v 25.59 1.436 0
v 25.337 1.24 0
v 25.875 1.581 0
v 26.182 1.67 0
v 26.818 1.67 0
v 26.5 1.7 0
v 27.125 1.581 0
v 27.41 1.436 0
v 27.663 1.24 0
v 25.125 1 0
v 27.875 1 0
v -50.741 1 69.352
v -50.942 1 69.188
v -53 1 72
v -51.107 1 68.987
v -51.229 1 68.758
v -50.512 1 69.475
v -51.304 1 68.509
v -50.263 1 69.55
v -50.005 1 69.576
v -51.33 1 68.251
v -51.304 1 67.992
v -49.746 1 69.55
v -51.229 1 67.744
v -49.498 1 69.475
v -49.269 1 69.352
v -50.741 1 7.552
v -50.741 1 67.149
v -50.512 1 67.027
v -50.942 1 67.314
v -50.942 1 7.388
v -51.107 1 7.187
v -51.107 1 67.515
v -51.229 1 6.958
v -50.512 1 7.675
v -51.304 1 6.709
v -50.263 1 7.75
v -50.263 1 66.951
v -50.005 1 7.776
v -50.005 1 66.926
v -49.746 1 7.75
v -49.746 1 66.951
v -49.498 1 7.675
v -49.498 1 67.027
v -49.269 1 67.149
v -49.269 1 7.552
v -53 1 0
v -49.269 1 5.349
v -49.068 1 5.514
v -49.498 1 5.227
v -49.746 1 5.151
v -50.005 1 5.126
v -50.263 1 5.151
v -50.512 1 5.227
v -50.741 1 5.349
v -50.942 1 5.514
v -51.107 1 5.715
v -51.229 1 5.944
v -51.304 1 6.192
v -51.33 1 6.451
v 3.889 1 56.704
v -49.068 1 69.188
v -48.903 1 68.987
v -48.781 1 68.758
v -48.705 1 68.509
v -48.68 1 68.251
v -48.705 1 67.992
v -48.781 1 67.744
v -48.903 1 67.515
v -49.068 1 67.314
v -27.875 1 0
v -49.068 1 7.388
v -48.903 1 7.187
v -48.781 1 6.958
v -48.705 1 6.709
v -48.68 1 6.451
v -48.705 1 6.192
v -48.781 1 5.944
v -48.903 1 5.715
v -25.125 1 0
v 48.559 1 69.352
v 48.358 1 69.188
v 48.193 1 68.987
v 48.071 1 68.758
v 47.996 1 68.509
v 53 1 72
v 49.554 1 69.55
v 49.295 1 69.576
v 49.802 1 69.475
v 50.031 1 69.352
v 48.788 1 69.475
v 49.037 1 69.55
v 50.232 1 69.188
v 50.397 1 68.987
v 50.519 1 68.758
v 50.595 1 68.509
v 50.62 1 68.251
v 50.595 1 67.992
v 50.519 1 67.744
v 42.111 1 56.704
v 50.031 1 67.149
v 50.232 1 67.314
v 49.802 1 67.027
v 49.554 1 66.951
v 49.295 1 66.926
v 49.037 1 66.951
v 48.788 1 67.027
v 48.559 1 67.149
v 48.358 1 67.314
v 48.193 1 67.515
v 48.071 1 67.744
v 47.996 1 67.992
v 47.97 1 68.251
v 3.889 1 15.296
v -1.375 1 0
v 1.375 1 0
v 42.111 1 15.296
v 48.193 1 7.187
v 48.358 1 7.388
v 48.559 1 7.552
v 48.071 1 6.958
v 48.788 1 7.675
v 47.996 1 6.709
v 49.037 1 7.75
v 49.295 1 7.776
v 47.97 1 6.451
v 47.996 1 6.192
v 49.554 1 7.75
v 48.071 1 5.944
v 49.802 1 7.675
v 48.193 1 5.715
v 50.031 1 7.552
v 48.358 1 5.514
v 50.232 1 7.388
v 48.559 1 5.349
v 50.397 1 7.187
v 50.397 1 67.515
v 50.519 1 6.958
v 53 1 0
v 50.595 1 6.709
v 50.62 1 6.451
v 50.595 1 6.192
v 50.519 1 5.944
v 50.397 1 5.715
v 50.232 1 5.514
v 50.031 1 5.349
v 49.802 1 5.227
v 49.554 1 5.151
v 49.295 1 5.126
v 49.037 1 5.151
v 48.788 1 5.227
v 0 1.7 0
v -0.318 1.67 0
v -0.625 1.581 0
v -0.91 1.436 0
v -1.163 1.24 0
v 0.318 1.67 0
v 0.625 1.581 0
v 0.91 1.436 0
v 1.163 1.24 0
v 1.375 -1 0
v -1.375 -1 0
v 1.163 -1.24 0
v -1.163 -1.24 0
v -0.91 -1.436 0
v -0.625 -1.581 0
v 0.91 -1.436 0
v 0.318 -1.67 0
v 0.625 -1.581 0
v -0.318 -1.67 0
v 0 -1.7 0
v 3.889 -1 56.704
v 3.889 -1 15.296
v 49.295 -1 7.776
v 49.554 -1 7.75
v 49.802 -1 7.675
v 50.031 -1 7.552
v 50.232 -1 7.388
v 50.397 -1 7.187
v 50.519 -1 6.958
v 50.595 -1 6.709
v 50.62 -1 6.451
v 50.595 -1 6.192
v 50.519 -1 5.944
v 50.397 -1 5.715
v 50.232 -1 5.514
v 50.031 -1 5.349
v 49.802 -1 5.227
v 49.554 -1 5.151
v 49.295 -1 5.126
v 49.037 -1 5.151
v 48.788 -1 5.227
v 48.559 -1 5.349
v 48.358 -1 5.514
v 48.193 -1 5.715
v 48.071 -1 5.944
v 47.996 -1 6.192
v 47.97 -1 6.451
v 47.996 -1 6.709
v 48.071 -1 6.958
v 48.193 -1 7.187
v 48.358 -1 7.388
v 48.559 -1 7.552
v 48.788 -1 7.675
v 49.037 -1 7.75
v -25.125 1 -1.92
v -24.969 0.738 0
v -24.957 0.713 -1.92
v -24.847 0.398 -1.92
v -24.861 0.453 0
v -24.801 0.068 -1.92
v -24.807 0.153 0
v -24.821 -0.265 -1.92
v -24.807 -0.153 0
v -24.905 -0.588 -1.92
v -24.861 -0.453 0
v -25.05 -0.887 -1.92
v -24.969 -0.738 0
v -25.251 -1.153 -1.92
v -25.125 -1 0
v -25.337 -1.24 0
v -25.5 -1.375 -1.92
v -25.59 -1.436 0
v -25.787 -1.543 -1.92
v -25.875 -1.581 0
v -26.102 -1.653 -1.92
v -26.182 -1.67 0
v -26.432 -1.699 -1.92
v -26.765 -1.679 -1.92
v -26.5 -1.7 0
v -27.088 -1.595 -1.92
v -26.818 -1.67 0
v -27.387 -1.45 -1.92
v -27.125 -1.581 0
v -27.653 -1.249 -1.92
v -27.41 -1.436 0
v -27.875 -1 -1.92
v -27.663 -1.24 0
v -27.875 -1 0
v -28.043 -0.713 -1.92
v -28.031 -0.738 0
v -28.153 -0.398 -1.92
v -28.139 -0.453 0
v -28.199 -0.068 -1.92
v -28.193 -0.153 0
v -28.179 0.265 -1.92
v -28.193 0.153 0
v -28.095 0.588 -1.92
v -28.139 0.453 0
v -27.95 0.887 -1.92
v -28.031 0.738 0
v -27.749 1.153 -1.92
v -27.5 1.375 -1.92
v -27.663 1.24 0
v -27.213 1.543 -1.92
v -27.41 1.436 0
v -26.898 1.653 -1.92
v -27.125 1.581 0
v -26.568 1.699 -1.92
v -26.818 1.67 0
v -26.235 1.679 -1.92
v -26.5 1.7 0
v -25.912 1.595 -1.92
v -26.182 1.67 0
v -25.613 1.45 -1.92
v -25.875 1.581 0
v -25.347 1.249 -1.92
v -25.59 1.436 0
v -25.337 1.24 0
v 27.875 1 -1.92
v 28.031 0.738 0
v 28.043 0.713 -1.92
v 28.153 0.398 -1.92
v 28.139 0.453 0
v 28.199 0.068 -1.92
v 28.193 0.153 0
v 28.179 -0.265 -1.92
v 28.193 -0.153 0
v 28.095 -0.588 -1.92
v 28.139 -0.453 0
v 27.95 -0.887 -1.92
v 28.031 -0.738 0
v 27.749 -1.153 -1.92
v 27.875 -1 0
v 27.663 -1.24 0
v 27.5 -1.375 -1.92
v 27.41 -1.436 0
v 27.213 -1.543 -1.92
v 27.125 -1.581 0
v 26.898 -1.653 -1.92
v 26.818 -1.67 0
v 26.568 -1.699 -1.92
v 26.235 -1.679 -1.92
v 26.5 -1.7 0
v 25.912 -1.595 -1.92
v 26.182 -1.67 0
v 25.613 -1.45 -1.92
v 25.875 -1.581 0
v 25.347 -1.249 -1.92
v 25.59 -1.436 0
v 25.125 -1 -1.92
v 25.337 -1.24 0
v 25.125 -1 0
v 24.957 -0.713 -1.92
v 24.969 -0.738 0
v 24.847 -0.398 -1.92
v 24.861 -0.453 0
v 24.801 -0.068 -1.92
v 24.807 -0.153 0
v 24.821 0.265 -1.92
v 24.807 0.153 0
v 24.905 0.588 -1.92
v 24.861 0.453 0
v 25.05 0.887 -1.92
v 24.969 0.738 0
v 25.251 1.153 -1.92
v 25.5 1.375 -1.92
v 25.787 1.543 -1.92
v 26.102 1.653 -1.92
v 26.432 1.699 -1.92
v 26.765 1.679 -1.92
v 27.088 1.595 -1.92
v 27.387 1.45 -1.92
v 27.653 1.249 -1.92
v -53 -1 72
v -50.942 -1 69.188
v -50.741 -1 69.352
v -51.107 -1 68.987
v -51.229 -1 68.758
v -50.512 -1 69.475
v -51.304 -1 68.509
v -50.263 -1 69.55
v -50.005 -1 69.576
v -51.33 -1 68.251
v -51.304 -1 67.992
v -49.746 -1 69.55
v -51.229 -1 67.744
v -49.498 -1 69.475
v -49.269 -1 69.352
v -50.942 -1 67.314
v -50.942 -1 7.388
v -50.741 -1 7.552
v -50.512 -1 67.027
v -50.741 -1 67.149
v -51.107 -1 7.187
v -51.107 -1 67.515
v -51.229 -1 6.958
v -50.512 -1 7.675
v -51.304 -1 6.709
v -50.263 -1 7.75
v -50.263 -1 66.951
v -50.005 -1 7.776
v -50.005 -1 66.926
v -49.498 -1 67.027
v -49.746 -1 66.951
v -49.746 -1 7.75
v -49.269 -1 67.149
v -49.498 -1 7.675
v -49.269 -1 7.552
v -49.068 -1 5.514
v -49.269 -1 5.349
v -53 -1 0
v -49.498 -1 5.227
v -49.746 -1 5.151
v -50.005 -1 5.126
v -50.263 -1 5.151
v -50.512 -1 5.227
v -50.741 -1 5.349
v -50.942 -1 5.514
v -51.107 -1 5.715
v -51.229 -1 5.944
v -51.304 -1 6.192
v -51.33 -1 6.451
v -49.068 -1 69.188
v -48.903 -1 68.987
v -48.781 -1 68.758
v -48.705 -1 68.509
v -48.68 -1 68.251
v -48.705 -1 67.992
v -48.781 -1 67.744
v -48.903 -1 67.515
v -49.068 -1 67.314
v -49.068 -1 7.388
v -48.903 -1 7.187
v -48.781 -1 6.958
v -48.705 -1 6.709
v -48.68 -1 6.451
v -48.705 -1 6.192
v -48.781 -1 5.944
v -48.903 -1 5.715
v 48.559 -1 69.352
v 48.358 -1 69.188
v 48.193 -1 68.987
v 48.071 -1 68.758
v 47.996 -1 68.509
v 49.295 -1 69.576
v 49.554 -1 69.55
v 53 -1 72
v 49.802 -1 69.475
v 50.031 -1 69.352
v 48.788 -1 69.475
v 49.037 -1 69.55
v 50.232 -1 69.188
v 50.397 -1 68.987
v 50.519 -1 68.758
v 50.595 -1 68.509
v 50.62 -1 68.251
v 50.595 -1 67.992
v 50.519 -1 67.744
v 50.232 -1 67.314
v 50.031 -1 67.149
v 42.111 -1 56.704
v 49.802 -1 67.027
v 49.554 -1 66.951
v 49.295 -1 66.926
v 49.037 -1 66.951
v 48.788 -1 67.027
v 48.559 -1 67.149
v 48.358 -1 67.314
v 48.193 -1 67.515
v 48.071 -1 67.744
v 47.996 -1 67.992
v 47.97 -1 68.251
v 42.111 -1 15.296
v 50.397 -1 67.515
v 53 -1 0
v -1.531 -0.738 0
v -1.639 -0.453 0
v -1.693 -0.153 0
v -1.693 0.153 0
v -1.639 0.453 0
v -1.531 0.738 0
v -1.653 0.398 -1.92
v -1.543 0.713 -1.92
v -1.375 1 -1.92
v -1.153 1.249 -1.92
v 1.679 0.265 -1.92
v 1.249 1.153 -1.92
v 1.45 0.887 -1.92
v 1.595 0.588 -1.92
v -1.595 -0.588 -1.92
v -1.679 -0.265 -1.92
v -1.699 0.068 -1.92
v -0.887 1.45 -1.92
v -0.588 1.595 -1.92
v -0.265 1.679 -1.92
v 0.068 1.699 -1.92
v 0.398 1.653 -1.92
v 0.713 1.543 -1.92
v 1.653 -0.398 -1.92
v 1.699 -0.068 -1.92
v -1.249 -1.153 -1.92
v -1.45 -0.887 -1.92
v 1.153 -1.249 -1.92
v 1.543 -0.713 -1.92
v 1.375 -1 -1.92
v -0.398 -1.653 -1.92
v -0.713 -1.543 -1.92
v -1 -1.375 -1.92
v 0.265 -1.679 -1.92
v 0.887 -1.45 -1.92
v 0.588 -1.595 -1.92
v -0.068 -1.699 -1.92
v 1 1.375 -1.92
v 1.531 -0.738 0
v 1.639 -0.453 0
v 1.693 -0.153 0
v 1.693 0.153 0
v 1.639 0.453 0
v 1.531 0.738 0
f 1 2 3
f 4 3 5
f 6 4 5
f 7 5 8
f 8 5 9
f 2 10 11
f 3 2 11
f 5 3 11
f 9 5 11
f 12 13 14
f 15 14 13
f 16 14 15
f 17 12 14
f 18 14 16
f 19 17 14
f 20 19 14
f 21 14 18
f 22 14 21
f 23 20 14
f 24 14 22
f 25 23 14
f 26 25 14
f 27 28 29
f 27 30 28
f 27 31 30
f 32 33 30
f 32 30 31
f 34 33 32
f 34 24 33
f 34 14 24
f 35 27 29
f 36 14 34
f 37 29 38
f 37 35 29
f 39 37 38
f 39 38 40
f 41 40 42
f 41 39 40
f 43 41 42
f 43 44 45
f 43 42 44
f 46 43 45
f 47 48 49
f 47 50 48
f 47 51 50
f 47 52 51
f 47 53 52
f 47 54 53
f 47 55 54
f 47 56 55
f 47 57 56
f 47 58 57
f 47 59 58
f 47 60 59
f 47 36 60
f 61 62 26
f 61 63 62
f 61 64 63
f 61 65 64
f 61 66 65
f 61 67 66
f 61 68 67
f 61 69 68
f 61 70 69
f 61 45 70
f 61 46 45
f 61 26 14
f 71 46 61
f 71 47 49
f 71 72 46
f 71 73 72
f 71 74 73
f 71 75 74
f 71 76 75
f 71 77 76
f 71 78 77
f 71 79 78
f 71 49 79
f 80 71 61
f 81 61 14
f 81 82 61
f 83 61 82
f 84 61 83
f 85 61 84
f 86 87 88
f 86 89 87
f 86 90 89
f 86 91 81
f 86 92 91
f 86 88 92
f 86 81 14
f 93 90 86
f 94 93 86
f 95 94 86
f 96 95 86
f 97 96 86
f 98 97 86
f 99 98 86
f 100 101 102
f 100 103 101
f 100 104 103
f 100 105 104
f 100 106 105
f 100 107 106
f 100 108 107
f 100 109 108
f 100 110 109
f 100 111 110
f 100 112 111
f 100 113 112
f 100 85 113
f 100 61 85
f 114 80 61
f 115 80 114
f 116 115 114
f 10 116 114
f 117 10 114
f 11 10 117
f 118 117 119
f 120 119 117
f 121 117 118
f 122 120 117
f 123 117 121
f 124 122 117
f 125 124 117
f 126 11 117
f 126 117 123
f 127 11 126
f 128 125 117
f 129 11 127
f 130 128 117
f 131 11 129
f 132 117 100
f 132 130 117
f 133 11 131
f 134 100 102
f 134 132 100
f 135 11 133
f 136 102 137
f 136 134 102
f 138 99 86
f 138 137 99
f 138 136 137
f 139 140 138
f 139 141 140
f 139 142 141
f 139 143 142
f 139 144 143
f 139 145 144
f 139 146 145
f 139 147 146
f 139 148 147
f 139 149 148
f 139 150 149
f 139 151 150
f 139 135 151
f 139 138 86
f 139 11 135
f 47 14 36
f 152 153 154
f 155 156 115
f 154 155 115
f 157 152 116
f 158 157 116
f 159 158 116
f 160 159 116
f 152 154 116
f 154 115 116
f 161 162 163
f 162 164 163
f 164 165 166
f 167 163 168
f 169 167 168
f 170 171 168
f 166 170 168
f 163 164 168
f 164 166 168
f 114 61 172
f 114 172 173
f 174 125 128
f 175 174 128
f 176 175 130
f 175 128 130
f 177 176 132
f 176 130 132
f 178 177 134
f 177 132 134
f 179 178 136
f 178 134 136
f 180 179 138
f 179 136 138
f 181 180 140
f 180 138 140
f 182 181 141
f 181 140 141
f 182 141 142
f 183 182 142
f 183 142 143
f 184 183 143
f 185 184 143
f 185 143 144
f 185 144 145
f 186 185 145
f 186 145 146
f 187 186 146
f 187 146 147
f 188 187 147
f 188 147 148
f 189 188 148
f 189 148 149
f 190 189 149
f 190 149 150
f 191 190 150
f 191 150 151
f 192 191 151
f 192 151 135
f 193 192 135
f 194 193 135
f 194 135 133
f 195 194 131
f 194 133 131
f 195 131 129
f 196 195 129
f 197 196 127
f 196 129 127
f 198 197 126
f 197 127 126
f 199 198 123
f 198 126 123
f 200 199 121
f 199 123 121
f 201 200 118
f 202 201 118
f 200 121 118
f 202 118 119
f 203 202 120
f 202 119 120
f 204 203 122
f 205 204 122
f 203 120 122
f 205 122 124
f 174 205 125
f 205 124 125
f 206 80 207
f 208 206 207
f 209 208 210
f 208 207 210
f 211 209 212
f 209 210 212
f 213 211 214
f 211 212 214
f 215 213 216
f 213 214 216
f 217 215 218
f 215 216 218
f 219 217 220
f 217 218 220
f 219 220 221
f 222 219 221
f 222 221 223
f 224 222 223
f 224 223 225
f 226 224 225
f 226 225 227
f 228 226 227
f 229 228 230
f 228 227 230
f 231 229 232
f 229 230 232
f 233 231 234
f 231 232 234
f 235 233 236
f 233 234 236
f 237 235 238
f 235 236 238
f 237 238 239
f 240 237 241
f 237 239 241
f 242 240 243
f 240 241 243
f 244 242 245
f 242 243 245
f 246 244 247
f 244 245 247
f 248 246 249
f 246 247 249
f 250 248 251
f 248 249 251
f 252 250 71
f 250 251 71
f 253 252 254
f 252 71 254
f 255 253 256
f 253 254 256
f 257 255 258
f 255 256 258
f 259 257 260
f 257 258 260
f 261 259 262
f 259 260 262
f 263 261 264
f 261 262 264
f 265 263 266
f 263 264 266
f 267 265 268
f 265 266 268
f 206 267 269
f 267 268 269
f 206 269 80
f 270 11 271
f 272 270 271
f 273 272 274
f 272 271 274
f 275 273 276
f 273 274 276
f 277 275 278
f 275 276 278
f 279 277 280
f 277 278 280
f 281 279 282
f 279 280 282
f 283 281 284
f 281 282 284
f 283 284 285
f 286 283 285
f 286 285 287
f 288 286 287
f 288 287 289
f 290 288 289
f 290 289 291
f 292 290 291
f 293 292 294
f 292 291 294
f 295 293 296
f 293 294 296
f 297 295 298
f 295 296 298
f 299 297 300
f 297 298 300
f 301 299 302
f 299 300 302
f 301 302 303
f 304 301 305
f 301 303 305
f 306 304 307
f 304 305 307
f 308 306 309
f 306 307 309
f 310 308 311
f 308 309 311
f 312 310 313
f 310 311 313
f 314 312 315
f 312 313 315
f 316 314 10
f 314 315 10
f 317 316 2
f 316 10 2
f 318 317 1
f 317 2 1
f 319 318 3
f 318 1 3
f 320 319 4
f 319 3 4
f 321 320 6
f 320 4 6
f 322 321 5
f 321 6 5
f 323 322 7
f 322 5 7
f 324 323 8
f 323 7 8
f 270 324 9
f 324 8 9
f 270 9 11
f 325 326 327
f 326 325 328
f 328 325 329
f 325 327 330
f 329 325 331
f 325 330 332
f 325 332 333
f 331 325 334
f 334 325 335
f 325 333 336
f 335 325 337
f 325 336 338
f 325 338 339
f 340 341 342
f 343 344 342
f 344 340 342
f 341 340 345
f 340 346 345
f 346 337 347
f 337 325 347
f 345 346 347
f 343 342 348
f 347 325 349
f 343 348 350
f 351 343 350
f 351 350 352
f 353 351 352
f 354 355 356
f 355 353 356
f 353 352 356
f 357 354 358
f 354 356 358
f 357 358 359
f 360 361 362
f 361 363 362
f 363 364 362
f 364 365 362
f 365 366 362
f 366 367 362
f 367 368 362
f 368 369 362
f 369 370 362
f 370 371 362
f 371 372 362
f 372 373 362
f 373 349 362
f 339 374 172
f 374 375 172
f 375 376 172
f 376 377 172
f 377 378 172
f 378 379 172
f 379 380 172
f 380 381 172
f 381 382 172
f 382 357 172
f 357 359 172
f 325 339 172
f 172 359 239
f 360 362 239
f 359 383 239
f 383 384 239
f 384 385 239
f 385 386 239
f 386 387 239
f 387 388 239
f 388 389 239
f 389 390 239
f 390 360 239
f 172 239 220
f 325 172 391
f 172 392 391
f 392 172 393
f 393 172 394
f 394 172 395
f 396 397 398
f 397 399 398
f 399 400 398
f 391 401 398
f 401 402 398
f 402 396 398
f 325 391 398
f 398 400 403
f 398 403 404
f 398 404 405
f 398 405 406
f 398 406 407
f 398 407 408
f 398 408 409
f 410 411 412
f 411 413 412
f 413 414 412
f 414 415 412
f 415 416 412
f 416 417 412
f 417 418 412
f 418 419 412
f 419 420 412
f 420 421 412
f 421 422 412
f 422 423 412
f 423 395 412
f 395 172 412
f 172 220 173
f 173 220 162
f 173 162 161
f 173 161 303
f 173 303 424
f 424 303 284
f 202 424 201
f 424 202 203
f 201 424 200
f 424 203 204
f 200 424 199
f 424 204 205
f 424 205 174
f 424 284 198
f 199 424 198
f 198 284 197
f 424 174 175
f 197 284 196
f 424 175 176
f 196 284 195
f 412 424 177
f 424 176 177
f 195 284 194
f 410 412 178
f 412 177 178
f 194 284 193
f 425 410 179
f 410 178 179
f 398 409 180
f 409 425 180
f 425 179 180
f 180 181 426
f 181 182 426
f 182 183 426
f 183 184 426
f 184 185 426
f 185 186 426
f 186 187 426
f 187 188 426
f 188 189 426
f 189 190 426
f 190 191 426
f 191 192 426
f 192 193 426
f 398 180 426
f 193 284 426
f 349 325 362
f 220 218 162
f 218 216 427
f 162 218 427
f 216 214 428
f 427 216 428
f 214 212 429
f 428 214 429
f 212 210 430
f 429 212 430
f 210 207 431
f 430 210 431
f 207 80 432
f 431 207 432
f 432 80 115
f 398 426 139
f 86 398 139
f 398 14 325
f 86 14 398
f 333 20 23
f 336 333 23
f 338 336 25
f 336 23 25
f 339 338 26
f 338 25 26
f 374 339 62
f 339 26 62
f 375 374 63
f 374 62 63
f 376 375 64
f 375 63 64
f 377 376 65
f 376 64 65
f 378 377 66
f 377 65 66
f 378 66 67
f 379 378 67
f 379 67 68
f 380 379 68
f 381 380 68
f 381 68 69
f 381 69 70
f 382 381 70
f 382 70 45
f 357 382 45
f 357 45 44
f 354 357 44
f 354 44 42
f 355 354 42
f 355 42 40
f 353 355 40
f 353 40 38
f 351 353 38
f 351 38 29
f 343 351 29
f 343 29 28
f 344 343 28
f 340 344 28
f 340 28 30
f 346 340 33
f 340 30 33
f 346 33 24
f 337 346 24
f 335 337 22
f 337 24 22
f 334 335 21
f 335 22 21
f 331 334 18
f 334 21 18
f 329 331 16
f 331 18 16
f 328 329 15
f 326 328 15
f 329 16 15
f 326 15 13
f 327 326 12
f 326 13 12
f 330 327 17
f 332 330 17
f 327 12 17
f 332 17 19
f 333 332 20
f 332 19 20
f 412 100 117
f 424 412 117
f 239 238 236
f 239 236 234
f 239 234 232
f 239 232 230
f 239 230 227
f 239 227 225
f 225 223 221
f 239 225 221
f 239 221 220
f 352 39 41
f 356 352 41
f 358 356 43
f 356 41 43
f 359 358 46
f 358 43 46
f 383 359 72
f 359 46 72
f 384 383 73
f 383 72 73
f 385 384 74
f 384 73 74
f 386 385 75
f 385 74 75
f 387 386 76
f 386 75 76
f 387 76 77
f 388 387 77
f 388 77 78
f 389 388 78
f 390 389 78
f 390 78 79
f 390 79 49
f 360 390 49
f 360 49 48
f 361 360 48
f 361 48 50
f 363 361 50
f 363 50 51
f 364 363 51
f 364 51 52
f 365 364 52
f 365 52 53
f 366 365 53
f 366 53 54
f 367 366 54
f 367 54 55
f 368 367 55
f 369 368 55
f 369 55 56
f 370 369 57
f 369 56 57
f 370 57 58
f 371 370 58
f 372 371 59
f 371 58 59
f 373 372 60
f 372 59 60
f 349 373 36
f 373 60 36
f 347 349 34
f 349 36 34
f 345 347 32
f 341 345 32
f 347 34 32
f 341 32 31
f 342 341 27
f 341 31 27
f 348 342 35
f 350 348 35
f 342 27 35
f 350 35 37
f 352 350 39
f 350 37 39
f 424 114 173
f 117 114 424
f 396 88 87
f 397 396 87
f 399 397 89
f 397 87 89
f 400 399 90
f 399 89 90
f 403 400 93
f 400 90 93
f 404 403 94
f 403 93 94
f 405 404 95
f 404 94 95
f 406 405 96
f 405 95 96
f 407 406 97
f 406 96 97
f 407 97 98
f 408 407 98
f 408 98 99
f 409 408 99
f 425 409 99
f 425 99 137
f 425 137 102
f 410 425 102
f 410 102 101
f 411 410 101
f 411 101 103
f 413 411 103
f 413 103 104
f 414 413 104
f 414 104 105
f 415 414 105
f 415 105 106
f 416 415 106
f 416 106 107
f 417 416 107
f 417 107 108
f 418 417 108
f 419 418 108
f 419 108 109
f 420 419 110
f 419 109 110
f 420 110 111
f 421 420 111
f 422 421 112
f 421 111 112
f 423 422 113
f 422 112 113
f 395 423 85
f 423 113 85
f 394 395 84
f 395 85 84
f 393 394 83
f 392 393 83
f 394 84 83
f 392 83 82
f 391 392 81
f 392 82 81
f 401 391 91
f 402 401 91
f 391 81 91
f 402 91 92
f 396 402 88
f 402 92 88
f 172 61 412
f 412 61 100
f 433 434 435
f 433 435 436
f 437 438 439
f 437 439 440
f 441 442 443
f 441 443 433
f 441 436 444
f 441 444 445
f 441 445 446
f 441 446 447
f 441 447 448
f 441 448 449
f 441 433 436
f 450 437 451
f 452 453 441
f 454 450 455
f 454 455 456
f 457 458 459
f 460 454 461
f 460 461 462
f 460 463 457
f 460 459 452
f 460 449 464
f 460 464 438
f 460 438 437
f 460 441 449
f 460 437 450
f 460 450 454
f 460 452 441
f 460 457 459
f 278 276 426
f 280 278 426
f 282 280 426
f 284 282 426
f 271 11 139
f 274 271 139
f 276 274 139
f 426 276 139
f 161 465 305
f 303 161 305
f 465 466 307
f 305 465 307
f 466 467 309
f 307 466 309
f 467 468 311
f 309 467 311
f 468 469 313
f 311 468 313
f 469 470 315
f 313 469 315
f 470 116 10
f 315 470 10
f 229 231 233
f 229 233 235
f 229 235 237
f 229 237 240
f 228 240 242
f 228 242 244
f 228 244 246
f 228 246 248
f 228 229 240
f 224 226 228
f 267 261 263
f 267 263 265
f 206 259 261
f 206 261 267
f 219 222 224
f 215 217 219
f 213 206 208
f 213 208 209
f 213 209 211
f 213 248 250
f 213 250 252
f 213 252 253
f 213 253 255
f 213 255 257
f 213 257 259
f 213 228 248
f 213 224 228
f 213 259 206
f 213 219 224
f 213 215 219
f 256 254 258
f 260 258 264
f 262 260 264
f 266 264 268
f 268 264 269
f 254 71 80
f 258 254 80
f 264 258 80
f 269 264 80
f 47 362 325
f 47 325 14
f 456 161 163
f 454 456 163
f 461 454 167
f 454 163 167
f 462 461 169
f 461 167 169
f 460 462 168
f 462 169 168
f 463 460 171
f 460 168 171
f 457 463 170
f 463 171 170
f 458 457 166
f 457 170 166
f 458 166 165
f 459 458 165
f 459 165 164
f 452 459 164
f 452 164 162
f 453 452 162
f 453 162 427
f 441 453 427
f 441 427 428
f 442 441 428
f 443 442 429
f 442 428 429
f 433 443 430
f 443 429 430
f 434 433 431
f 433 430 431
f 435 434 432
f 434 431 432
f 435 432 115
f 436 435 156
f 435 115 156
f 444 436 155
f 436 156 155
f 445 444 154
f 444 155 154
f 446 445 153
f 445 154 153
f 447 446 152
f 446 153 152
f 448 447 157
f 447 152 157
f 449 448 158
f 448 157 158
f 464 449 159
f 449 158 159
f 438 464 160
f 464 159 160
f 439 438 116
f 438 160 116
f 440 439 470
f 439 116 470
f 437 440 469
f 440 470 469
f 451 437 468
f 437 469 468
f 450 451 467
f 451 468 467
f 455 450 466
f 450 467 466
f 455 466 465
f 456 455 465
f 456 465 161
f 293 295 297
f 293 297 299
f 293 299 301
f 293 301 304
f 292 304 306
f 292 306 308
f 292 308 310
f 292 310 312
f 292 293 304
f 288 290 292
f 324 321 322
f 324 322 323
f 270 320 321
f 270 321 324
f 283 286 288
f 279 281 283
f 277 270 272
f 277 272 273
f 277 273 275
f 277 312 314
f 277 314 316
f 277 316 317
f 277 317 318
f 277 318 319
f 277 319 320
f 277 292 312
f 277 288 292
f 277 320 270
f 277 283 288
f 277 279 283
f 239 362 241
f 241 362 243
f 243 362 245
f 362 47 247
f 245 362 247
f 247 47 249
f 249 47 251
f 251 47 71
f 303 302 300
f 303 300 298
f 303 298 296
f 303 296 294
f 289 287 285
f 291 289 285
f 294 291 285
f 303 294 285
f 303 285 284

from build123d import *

# Parameters (mm, degrees)
SKETCH2_W           = 106
SKETCH2_H           = 2
BOSS_EXTRUDE1_DEPTH = 72
SKETCH4_R           = 1.325
CUT_EXTRUDE1_DEPTH  = 90.425947018
SKETCH6_W           = 38.22100301
SKETCH6_H           = 41.408309334
CUT_EXTRUDE3_DEPTH  = 10
SKETCH5_R           = 1.7
BOSS_EXTRUDE2_DEPTH = 1.92


with BuildPart() as part:
    # Sketch2 → Boss-Extrude1 (new body)
    with BuildSketch(Plane.XY):
        Rectangle(SKETCH2_W, SKETCH2_H)
    extrude(amount=BOSS_EXTRUDE1_DEPTH)

    # Sketch4 → Cut-Extrude1 (cut, through all)
    with BuildSketch(Plane(origin=(0, 1, 0), x_dir=(1, 0, 0), z_dir=(0, 1, 0))):
        with Locations(Location((-50.004878073, -6.450693227, 0), (0, 0, 270))):
            Circle(SKETCH4_R)
        with Locations(Location((-50.004878073, -68.250693227, 0), (0, 0, 270))):
            Circle(SKETCH4_R)
        with Locations(Location((49.295121927, -68.250693227, 0), (0, 0, 270))):
            Circle(SKETCH4_R)
        with Locations(Location((49.295121927, -6.450693227, 0), (0, 0, 270))):
            Circle(SKETCH4_R)
    extrude(amount=-CUT_EXTRUDE1_DEPTH, mode=Mode.SUBTRACT)

    # Sketch6 → Cut-Extrude3 (cut)
    with BuildSketch(Plane(origin=(0, 1, 0), x_dir=(1, 0, 0), z_dir=(0, 1, 0))):
        with Locations((23, -36)):
            Rectangle(SKETCH6_W, SKETCH6_H)
    extrude(amount=-CUT_EXTRUDE3_DEPTH, mode=Mode.SUBTRACT)

    # Sketch5 → Boss-Extrude2 (add)
    with BuildSketch(Plane(origin=(0, 0, 0), x_dir=(-1, 0, 0), z_dir=(0, 0, -1))):
        with Locations(Location((0, 0, 0), (0, 0, 216.031879072))):
            Circle(SKETCH5_R)
        with Locations(Location((26.5, 0, 0), (0, 0, 143.968120928))):
            Circle(SKETCH5_R)
        with Locations(Location((-26.5, 0, 0), (0, 0, 143.968120928))):
            Circle(SKETCH5_R)
    extrude(amount=BOSS_EXTRUDE2_DEPTH)


solid = part.part
